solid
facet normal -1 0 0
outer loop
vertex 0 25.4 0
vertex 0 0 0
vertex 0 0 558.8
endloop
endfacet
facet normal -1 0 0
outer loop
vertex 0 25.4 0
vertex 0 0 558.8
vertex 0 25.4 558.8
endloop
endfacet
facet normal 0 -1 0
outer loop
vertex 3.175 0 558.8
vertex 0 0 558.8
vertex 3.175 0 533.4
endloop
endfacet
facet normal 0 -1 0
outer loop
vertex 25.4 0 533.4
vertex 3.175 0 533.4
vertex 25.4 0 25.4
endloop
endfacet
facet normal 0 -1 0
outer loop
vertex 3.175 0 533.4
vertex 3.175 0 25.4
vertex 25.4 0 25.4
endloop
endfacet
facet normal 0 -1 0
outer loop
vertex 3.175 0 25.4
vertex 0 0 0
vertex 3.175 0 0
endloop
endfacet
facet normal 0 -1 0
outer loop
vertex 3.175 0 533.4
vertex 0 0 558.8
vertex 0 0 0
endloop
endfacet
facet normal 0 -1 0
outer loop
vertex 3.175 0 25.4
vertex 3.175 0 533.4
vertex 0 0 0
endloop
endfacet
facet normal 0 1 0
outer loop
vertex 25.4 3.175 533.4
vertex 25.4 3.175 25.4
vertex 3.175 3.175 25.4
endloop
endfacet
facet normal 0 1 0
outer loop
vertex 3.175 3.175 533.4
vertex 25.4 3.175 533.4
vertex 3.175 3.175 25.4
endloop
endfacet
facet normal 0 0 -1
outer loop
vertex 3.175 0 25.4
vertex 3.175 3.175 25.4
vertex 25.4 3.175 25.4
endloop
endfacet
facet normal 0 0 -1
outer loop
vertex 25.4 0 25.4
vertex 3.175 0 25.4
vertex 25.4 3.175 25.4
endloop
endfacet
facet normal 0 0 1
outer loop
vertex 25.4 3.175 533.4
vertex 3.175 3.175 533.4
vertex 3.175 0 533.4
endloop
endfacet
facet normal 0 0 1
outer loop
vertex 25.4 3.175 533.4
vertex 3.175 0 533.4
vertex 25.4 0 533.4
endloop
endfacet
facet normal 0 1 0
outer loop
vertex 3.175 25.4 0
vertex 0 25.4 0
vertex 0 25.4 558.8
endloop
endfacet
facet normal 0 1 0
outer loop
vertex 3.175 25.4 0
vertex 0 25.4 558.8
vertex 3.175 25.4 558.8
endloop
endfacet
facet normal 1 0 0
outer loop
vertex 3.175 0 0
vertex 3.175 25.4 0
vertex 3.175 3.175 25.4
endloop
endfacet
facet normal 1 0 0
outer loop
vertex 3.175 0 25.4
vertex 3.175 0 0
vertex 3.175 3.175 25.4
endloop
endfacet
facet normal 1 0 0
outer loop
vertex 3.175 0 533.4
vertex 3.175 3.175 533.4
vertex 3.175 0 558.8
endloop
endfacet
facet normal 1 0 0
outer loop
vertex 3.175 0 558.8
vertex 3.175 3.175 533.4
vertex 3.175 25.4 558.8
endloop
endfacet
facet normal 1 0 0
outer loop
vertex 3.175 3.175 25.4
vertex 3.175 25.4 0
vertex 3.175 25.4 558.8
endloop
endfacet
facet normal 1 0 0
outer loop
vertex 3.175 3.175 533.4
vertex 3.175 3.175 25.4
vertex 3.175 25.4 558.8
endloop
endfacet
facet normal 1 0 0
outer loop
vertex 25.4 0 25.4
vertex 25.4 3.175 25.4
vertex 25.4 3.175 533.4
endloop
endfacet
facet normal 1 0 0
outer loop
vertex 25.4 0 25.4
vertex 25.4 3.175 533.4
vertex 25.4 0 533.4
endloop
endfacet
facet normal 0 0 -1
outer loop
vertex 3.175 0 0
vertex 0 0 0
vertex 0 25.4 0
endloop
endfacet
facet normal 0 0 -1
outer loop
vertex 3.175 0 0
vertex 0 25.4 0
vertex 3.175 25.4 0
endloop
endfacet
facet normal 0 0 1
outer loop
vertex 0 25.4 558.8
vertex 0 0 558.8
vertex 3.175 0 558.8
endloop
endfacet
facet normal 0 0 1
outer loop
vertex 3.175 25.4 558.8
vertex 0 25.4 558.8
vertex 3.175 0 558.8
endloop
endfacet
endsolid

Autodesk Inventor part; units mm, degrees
ref_plane "YZ Plane" through (0, 0, 0) normal (1, 0, 0) x (0, 1, 0)
ref_plane "XZ Plane" through (0, 0, 0) normal (0, 1, 0) x (-1, 0, 0)
ref_plane "XY Plane" through (0, 0, 0) normal (0, 0, 1) x (1, 0, 0)
sketch "Sketch1" plane through (0, 0, 0) normal (0, 0, 1) x (1, 0, 0)
  line L0 (0, 0) -> (0, 25.4)
  line L1 (0, 0) -> (25.4, 0)
  line L2 (25.4, 3.175) -> (3.175, 3.175)
  line L3 (3.175, 3.175) -> (3.175, 25.4)
  line L4 (25.4, 3.175) -> (25.4, 0)
  line L5 (0, 25.4) -> (3.175, 25.4)
  dimension "d0" = 25.4
  dimension "d1" = 25.4
  dimension "d2" = 3.175
extrude "Extrusion1" add sketch "Sketch1" along normal blind 558.8
sketch "Sketch2" plane through (3.175, 3.175, 0) normal (0, 1, 0) x (1, 0, 0)
  line L0 (0, 0) -> (0, -558.8) projected
  line L1 (0, -25.4) -> (22.225, -25.4)
  line L2 (22.225, 0) -> (22.225, -558.8) projected
  line L3 (0, -533.4) -> (22.225, -533.4)
  line L4 (22.225, -558.8) -> (0, -558.8) projected
  line L5 (0, 0) -> (22.225, 0) projected
  line L6 (22.225, -533.4) -> (22.225, -558.8)
  line L7 (0, -558.8) -> (0, -533.4)
  line L8 (-3.175, -558.8) -> (22.225, -558.8) projected
  line L9 (0, -25.4) -> (0, 0)
  line L10 (-3.175, 0) -> (-3.175, -558.8) projected
  line L11 (22.225, 0) -> (-3.175, 0) projected
  line L12 (0, 0) -> (22.225, 0)
  line L13 (22.225, 0) -> (22.225, -25.4)
  line L14 (0, -558.8) -> (22.225, -558.8)
  dimension "d5" = 25.4
  dimension "d6" = 25.4
extrude "Extrusion2" cut sketch "Sketch2" against normal blind 25.4 contours L5 L2 L1 L0 | L3 L2 L4 L0
properties part number "22 cut 20 L bracket"
